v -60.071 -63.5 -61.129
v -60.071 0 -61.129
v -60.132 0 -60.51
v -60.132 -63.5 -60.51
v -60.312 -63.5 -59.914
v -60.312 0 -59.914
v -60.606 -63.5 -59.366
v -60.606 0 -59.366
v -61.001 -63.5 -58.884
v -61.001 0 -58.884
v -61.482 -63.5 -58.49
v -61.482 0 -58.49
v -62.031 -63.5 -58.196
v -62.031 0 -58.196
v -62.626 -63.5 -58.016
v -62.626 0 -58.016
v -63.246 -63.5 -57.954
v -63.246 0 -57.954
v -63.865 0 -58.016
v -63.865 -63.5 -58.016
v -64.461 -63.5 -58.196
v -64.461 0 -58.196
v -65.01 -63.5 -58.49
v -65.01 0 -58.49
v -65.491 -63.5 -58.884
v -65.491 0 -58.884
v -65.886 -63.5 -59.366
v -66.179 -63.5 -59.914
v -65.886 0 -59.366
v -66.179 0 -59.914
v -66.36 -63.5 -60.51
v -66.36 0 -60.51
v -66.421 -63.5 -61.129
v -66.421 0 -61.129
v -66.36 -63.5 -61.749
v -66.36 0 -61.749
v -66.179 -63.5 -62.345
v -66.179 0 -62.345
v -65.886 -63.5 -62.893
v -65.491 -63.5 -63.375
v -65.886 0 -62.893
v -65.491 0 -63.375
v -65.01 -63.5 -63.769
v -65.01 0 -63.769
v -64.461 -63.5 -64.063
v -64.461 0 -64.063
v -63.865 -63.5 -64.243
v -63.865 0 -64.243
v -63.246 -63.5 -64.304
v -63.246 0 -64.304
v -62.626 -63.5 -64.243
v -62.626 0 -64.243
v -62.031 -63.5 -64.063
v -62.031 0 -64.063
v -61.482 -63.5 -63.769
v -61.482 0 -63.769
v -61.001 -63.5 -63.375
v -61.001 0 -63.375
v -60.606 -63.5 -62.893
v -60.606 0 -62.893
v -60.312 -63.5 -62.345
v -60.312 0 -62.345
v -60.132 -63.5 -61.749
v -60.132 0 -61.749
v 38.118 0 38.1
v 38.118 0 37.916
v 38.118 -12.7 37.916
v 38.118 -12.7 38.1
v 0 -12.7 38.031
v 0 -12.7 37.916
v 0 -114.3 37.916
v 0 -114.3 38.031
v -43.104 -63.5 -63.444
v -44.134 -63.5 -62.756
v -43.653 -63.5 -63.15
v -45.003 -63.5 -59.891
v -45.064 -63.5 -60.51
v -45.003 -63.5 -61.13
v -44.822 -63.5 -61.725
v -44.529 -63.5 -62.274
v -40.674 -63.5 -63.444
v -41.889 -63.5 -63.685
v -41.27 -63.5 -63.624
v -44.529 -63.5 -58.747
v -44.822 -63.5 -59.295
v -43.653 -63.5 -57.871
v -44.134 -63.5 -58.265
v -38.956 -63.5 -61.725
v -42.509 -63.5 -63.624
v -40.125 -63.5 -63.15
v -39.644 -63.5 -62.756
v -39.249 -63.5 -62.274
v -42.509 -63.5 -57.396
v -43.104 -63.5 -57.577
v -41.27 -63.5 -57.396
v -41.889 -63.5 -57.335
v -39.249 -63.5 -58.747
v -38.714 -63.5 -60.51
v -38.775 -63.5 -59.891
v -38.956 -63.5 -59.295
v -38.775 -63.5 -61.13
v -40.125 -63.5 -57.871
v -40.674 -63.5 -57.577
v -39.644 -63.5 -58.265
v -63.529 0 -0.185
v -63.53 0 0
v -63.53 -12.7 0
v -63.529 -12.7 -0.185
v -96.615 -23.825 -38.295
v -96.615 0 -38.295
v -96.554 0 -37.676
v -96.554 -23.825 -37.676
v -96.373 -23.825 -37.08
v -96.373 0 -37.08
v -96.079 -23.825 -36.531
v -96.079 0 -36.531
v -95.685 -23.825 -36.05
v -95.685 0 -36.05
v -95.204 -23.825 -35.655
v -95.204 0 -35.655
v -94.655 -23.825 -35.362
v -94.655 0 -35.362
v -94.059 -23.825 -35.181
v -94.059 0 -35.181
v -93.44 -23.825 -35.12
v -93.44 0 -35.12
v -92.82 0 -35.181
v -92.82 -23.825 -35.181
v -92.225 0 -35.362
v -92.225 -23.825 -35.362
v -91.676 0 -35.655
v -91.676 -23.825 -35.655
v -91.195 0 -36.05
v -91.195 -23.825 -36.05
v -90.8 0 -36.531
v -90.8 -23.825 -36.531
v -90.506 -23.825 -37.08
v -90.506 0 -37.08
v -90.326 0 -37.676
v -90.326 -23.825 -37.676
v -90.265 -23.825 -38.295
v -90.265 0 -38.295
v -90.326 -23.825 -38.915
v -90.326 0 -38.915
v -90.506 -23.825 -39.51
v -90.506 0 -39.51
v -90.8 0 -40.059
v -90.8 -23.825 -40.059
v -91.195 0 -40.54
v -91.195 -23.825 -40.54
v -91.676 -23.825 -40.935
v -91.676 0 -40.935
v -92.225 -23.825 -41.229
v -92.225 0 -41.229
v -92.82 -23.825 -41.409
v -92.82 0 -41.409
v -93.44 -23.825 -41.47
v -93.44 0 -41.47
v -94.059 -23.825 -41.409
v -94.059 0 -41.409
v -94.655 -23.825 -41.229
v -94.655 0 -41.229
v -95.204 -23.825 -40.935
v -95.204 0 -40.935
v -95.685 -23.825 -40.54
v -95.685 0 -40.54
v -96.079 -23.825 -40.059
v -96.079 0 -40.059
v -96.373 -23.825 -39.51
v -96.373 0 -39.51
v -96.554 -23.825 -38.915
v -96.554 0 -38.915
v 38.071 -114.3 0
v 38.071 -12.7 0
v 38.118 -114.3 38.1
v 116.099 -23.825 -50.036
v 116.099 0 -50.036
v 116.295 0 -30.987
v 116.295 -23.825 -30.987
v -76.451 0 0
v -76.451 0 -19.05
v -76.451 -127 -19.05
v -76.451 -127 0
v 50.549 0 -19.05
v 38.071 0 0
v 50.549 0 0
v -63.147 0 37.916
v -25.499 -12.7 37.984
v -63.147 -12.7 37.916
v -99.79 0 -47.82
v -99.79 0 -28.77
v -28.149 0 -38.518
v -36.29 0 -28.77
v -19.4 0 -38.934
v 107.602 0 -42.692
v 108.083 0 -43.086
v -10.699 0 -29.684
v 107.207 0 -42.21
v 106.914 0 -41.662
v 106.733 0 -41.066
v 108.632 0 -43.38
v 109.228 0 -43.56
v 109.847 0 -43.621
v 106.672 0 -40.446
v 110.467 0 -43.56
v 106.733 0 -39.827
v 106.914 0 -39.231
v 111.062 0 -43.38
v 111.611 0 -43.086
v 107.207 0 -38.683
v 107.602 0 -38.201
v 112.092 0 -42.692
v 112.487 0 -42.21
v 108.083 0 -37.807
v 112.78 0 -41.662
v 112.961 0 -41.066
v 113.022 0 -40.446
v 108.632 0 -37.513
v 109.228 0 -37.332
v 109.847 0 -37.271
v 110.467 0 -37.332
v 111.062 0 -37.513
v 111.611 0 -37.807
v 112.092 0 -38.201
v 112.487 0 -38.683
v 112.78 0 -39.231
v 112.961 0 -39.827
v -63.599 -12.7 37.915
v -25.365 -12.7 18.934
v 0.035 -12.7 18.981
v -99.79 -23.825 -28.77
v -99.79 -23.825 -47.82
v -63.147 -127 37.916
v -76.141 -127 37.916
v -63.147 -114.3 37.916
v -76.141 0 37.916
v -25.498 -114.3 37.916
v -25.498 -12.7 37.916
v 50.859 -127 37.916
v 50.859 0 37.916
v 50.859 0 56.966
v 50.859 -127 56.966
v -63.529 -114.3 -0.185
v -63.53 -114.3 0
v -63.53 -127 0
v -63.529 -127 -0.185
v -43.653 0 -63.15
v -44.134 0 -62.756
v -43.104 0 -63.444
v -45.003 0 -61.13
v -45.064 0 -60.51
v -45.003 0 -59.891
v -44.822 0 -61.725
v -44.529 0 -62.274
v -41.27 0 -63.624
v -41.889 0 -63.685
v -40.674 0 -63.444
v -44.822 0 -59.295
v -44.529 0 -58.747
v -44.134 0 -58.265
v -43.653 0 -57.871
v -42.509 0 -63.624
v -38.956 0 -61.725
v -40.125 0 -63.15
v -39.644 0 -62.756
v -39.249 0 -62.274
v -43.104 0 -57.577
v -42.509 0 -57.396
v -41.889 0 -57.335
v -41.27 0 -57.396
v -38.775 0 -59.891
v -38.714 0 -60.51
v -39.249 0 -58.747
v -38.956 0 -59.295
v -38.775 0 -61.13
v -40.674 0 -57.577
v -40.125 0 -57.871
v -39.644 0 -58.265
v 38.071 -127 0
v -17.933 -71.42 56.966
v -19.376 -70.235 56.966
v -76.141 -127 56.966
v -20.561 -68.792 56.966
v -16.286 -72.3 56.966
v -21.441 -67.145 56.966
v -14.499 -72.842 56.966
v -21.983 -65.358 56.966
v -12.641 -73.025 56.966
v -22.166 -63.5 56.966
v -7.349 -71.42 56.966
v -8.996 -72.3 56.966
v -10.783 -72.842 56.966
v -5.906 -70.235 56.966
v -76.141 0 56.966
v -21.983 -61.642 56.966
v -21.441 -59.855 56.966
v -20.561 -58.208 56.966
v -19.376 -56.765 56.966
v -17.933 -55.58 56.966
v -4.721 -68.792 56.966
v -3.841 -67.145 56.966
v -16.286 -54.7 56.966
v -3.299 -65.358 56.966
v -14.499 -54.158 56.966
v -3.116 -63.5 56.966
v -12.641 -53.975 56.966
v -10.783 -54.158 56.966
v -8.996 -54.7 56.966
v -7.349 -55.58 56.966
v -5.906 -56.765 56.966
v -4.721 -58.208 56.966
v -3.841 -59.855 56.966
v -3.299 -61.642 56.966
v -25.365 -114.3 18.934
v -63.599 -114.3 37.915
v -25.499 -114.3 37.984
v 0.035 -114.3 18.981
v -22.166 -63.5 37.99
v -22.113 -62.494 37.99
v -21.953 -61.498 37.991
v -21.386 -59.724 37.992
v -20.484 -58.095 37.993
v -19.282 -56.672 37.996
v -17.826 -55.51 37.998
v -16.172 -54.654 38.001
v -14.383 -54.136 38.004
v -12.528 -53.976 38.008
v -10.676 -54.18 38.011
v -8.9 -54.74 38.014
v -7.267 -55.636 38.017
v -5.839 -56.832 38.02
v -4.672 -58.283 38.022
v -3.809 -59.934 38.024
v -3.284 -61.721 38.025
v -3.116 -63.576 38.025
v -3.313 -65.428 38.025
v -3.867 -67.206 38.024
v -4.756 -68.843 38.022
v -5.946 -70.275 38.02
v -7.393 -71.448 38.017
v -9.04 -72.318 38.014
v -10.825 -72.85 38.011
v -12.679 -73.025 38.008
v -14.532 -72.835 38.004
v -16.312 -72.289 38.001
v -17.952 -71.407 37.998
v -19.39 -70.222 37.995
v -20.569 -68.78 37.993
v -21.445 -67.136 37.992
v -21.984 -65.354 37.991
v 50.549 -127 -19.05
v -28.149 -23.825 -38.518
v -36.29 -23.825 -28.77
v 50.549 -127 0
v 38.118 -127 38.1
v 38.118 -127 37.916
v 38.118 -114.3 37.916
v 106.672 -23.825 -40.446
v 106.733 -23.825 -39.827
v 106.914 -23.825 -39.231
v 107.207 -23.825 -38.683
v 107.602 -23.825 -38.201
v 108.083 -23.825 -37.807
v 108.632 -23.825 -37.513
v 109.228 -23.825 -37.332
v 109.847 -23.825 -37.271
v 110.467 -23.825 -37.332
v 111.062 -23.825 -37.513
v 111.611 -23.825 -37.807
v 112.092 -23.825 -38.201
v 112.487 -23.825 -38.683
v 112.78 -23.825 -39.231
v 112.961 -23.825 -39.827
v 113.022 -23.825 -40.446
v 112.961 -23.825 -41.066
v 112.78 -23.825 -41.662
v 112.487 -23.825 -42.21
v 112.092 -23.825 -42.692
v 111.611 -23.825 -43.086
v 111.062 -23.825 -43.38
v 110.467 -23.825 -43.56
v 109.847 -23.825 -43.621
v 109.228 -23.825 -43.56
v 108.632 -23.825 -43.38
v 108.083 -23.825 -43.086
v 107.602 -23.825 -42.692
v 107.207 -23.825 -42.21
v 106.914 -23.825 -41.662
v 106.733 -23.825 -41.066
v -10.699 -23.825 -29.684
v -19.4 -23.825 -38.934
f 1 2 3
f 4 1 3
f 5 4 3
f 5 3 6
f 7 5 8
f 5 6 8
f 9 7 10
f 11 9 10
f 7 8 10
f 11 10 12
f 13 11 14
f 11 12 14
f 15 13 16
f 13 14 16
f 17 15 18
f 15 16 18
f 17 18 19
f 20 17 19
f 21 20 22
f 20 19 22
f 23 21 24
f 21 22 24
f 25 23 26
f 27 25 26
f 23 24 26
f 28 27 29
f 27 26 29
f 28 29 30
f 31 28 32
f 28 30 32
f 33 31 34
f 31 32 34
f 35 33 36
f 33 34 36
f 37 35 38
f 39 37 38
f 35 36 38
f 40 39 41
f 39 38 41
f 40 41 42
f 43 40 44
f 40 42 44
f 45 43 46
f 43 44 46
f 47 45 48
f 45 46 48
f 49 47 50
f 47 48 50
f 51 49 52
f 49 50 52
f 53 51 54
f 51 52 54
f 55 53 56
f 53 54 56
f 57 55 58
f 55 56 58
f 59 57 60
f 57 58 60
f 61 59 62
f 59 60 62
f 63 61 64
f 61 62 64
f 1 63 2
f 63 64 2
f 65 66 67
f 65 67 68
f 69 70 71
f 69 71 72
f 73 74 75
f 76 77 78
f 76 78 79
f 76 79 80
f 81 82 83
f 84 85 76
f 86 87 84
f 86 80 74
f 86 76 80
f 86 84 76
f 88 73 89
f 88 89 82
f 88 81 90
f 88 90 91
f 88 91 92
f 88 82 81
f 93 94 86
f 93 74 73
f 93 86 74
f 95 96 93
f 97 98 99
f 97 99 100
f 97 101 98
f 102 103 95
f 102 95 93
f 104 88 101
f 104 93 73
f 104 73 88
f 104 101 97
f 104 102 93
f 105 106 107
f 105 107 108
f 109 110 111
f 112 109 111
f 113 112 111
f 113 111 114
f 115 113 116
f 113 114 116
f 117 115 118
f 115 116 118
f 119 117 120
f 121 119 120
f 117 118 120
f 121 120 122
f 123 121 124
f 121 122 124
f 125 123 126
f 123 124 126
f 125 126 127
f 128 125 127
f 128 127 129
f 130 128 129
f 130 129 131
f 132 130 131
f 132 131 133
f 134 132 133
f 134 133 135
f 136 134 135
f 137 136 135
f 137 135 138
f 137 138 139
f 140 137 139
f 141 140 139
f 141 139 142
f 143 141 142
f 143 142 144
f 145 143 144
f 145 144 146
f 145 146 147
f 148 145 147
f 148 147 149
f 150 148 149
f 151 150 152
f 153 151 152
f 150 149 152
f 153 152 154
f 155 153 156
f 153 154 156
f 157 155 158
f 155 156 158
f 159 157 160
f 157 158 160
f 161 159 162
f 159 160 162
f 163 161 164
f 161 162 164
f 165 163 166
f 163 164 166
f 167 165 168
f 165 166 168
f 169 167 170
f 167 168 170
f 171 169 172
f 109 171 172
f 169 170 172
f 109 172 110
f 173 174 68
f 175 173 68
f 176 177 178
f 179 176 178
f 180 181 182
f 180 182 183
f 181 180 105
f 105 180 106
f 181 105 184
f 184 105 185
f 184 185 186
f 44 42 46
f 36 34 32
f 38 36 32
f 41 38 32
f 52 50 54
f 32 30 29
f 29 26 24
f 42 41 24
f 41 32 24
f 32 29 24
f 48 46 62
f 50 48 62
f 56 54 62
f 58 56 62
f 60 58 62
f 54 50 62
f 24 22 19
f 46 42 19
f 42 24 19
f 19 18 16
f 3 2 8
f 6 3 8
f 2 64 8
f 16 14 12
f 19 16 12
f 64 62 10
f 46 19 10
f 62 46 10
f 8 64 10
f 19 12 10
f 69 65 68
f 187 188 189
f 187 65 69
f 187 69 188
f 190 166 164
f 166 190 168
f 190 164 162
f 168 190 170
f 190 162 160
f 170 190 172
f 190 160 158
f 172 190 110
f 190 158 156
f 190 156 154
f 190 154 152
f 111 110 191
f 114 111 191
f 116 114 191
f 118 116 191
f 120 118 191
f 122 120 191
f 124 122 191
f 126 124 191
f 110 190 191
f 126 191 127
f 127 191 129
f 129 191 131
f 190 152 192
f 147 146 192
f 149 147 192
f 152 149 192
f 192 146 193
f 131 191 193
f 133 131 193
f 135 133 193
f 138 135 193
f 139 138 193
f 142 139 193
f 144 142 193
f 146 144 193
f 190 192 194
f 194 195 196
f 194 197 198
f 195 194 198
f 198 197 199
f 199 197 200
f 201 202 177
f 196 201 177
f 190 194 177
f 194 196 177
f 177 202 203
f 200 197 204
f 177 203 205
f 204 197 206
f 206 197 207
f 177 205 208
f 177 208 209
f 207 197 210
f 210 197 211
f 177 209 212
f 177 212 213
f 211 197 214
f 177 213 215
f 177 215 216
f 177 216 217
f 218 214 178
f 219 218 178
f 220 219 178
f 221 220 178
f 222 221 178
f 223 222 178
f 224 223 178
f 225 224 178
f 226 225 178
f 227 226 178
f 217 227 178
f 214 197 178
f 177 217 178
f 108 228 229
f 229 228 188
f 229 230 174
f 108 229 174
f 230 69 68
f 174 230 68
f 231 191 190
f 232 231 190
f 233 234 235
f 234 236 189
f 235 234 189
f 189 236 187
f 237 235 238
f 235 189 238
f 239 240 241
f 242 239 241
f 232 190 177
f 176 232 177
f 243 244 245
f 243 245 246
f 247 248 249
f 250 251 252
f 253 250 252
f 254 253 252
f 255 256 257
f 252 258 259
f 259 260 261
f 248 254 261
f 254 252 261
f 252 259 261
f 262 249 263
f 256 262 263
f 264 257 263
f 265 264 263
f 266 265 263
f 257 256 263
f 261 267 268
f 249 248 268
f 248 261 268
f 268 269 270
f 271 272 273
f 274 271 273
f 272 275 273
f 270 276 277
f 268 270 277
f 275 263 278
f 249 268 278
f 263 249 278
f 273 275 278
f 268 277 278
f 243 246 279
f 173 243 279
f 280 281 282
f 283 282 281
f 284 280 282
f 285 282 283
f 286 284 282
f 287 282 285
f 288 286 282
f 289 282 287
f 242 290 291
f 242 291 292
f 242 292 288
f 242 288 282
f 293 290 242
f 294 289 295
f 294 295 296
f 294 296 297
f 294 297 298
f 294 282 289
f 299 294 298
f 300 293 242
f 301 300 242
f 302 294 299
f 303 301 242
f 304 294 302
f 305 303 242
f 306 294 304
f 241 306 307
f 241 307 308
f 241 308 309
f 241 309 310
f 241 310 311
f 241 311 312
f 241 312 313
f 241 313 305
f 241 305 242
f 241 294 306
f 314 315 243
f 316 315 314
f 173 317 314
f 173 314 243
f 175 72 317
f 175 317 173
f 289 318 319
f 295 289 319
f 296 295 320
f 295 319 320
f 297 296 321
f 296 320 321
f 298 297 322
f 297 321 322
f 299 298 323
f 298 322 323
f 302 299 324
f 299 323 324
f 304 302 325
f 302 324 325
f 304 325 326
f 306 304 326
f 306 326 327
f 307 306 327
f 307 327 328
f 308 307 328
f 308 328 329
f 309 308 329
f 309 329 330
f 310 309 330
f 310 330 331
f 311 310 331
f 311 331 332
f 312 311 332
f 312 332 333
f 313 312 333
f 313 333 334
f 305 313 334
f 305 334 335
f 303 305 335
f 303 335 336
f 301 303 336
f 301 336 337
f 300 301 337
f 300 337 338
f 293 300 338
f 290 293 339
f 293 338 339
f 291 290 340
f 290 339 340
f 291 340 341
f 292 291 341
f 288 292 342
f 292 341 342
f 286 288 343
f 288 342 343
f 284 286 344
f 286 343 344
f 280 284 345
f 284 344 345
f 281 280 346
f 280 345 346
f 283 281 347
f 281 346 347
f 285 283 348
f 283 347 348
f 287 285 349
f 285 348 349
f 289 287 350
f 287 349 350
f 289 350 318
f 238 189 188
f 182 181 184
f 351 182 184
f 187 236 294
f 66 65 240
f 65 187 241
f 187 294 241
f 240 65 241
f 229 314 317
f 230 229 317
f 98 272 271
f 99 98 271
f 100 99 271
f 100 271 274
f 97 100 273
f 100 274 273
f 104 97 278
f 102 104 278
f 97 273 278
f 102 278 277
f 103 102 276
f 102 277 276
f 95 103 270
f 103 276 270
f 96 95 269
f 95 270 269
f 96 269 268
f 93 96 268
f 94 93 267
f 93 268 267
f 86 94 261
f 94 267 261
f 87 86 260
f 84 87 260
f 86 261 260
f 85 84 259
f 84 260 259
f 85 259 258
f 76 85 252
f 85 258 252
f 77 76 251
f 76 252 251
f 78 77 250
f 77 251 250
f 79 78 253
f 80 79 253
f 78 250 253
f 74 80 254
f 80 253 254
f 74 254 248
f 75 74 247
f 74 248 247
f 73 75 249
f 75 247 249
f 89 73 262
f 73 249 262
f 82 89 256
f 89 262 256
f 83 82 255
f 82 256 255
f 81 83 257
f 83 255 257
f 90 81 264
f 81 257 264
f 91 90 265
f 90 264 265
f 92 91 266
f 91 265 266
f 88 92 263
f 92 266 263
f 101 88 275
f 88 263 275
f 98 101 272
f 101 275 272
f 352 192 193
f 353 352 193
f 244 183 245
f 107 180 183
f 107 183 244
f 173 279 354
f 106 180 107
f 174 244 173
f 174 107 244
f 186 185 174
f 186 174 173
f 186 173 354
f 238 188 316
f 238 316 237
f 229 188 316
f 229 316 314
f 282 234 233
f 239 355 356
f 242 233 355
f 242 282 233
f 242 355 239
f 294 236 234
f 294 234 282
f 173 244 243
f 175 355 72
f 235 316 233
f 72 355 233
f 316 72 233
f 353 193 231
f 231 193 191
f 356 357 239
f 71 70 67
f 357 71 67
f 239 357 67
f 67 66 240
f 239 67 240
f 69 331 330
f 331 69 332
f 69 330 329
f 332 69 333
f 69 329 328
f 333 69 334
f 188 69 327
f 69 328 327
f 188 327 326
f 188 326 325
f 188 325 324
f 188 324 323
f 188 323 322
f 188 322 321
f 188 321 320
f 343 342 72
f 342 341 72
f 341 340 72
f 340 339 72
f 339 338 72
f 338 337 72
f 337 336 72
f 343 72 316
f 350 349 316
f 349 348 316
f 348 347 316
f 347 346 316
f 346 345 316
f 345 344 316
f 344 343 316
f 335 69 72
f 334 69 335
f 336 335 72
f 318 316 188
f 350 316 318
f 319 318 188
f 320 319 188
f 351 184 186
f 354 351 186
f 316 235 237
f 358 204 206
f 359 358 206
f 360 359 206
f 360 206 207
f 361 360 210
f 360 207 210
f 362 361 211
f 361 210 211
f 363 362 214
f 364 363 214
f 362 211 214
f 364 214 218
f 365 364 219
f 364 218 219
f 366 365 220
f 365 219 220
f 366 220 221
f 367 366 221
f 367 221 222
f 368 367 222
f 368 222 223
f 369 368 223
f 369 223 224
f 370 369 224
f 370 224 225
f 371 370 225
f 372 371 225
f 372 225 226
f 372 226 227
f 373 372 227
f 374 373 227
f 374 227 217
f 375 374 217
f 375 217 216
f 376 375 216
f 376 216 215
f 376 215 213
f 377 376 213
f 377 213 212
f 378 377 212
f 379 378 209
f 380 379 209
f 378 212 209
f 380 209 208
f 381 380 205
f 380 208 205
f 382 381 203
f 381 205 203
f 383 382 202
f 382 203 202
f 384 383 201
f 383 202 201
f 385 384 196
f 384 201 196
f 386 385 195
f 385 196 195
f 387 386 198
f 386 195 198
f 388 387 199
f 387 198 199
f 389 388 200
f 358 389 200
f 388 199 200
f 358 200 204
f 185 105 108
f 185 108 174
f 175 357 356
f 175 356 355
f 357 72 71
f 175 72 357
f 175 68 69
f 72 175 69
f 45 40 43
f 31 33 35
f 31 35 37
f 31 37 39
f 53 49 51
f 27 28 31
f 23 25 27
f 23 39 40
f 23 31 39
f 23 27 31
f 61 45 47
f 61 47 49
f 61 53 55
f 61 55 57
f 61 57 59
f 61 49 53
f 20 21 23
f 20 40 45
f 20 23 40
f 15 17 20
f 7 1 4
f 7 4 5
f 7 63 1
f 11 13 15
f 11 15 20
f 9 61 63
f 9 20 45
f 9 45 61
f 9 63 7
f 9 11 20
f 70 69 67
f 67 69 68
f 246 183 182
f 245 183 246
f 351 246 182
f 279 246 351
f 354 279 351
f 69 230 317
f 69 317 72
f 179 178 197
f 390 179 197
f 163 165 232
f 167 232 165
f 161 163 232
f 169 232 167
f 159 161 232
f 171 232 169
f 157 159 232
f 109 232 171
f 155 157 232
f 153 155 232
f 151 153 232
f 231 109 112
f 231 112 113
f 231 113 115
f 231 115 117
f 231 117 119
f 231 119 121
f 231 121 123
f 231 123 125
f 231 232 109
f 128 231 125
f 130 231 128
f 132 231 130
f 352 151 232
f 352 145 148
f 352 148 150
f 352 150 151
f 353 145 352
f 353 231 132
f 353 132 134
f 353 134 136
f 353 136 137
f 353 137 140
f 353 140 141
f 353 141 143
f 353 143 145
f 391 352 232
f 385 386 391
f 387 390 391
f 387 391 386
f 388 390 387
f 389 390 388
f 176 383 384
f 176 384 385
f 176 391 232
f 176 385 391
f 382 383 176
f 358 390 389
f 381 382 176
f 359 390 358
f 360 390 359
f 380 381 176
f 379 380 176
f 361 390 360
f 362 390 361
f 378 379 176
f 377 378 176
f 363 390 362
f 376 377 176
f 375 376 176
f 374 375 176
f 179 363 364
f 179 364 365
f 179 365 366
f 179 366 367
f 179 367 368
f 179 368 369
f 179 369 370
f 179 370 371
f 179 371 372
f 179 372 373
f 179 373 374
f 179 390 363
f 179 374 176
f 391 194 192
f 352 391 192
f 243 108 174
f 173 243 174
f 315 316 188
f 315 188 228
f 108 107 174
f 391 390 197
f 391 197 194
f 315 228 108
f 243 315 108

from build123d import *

# Parameters (mm, degrees)
F0_W      = 127
F0_H      = 19.05
F3_DEPTH  = 127
F2_W      = 127
F2_H      = 19.05
F4_DEPTH  = 127
F5_DEPTH  = 127
F6_DEPTH  = 12.7
F7_DEPTH  = 12.7
F9_DEPTH  = 114.301
F11_D     = 19.05
F11_DEPTH = 19.05
F11_TIP   = 5.7231973962
F13_DEPTH = 23.8252
F15_D     = 6.35
F16_R     = 3.175
F17_DEPTH = 63.5
F18_DEPTH = 63.5


with BuildPart() as f3:
    # F0 (on Front) → F3 (new body)
    with BuildSketch(Plane.XZ):
        with Locations((-12.6410444975, 47.4407625139)):
            Rectangle(F0_W, F0_H)
    extrude(amount=F3_DEPTH)


with BuildPart() as f4:
    # F2 (on Front) → F4 (new body)
    with BuildSketch(Plane.XZ):
        with Locations((-12.9505639672, -9.525)):
            Rectangle(F2_W, F2_H)
    extrude(amount=F4_DEPTH)


with BuildPart() as f5:
    # F1 (on Front) → F5 (new body)
    with BuildSketch(Plane.XZ):
        Polygon((38.070525974, 0), (38.1177432447, 38.0999707418), (-63.5986121923, 37.9149412066), (-63.5293056034, -0.1849957566), align=None)
    extrude(amount=F5_DEPTH)


with BuildPart() as f6_tool:
    # F6 (cut): a face of the model
    f6_faces = [f5.part.faces().sort_by_distance(p)[0] for p in [
        (-12.7349528417, 0, 18.9611182595),
    ]]
    extrude(f6_faces, amount=-F6_DEPTH)


with BuildPart() as f3_1:
    add(f3.part)

    # F6: cut by f6_tool
    add(f6_tool.part, mode=Mode.SUBTRACT)


with BuildPart() as f4_1:
    add(f4.part)

    # F6: cut by f6_tool
    add(f6_tool.part, mode=Mode.SUBTRACT)


with BuildPart() as f5_1:
    add(f5.part)

    # F6: cut by f6_tool
    add(f6_tool.part, mode=Mode.SUBTRACT)


with BuildPart() as f7_tool:
    # F7 (cut): a face of the model
    f7_faces = [f5_1.part.faces().sort_by_distance(p)[0] for p in [
        (-12.7349528417, -127, 18.9611182595),
    ]]
    extrude(f7_faces, amount=-F7_DEPTH)


with BuildPart() as f3_2:
    add(f3_1.part)

    # F7: cut by f7_tool
    add(f7_tool.part, mode=Mode.SUBTRACT)


with BuildPart() as f4_2:
    add(f4_1.part)

    # F7: cut by f7_tool
    add(f7_tool.part, mode=Mode.SUBTRACT)


with BuildPart() as f5_2:
    add(f5_1.part)

    # F7: cut by f7_tool
    add(f7_tool.part, mode=Mode.SUBTRACT)


with BuildPart() as f9_tool:
    # F8 (on face) → F9 (new body, through all)
    with BuildSketch(Plane.XZ.offset(114.3)):
        Polygon((0, 38.030631762), (-25.4986752292, 37.9842477955), (-25.365304681, 18.9344588878), (0.0346532944, 18.9806632804), align=None)
    extrude(amount=-F9_DEPTH)


with BuildPart() as f3_3:
    add(f3_2.part)

    # F9: cut by f9_tool
    add(f9_tool.part, mode=Mode.SUBTRACT)

    # F11
    with Locations(Plane.XY.offset(56.9657625139)):
        with Locations((-12.6410444975, -63.5)):
            Hole(F11_D / 2, depth=F11_DEPTH)
            with Locations((0, 0, -(F11_DEPTH + F11_TIP / 2))):  # 118° drill point
                Cone(0, F11_D / 2, F11_TIP, mode=Mode.SUBTRACT)


with BuildPart() as f5_3:
    add(f5_2.part)

    # F9: cut by f9_tool
    add(f9_tool.part, mode=Mode.SUBTRACT)


with BuildPart() as f13:
    # F12 (on Front) → F13 (new body)
    with BuildSketch(Plane.XZ):
        Polygon((-99.7895821929, -28.7702886879), (-99.7895821929, -47.8202886879), (116.0990463358, -50.0361569129), (116.2945641204, -30.987160278), (-10.6987467789, -29.683708381), (-19.4000976518, -38.9344647277), (-28.1488456053, -38.5180272878), (-36.2895821929, -28.7702886879), align=None)
    extrude(amount=F13_DEPTH)

    # F15 (through all)
    with Locations(Plane.XZ.offset(23.8252)):
        with Locations((-93.4395821929, -38.2952886879), (109.8471396831, -40.4464860006)):
            Hole(F15_D / 2)


with BuildPart() as f17:
    # F16 (on Front) → F17 (new body)
    with BuildSketch(Plane.XZ):
        with Locations((-63.2458105683, -61.1294955015)):
            Circle(F16_R)
    extrude(amount=F17_DEPTH)

    # F16 (on Front) → F18 (join)
    with BuildSketch(Plane.XZ):
        with Locations((-63.2458105683, -61.1294955015)):
            Circle(F16_R)
    extrude(amount=F18_DEPTH)


with BuildPart() as f18:
    # F16 (on Front) → F18, piece 2 (new body)
    with BuildSketch(Plane.XZ):
        with Locations((-41.8891720474, -60.5104640126)):
            Circle(F16_R)
    extrude(amount=F18_DEPTH)


solid = Compound([f4_2.part, f3_3.part, f5_3.part, f13.part, f17.part, f18.part])
